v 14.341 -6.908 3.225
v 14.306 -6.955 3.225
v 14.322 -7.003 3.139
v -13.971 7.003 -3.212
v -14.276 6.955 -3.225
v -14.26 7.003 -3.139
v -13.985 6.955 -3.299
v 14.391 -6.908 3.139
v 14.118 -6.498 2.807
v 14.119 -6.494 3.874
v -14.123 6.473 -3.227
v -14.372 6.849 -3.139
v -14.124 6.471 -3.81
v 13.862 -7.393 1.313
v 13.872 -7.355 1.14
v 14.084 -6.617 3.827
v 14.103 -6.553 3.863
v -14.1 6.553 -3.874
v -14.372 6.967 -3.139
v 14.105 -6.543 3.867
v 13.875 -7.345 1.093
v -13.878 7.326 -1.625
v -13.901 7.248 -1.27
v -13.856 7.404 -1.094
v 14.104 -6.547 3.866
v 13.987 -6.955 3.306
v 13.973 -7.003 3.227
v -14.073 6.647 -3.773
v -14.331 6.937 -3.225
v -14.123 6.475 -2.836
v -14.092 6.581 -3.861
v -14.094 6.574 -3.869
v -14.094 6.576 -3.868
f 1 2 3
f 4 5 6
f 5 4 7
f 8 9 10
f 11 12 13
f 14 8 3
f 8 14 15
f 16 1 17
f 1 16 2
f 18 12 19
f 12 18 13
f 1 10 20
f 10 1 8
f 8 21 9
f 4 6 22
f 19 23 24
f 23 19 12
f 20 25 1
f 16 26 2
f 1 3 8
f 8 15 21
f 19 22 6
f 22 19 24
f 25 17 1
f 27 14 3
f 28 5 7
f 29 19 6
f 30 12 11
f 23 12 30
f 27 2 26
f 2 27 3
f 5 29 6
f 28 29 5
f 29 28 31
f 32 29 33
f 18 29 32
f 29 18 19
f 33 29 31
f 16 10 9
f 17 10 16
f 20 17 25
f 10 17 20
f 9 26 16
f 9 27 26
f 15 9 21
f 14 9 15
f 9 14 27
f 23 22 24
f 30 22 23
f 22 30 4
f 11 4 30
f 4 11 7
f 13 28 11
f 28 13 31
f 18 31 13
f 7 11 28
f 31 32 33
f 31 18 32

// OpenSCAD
// Auto-generated OpenSCAD file

    inner_points = 10*[[-1.3196803278726468, 0.9362046957981746, -6.595639077981762e-13], [1.3196795770729461, -0.9362042464911885, 6.595639077981762e-13], [-0.5584491756654331, 1.4751697470422118, -0.3606158710418413], [1.5768378417073974, -0.039640907689503124, -0.360615871040774], [-1.576838592507098, 0.039641356996489185, 0.360615871040774], [0.5584484248657327, -1.4751692977352255, 0.3606158710418413], [0.41609043726663214, 1.4506701799017077, -0.5834887362276886], [1.231697502166666, 0.8720639963146739, -0.583488736227281], [-1.2316982529663667, -0.8720635470076878, 0.583488736227281], [-0.41609118806633266, -1.4506697305947214, 0.5834887362276886], [0.3400958061980706, 0.4794020290670393, -0.8090169943749945], [-0.34009655699777114, -0.47940157976005326, 0.8090169943749945], [-0.6344438067339944, 0.5039015962075438, -0.5861441291891473], [0.685236145738802, -0.43230287493713776, -0.5861441291884877], [-0.6852368965385024, 0.4323033242441238, 0.5861441291884877], [0.634443055934294, -0.5039011469005578, 0.5861441291891473], [0.07599425566871129, 0.9712683754881611, 0.22552825814730598], [0.8916013205687453, 0.3926621919011276, 0.22552825814771355], [-0.8916020713684457, -0.39266174259414155, -0.22552825814771355], [-0.07599500646841176, -0.9712679261811751, -0.22552825814730598]];

    outer_points = 10*[[0.38730796483642055, 0.32816512550448207, 1.536337911895294], [-0.38730796483642055, -0.32816512550448207, -1.536337911895294], [1.122601014421019, -0.22411714494778695, 1.1434913451842328], [0.49592356320214137, -0.7550994719364139, -1.3423556144673943], [-0.49592356320214137, 0.7550994719364139, 1.3423556144673943], [-1.122601014421019, 0.22411714494778695, -1.1434913451842328], [1.4290986323018988, -0.6907942834915881, 0.3138699504541333], [1.189729145919442, -0.8936114849757331, -0.6356390973021997], [-1.189729145919442, 0.8936114849757331, 0.6356390973021997], [-1.4290986323018988, 0.6907942834915881, -0.3138699504541333], [0.9696619025702452, 0.0, -0.24444998405369595], [-0.9696619025702452, 0.0, 0.24444998405369595], [0.6631642846893652, 0.46667713854380116, 0.5851714106764037], [0.2758563198529447, 0.1385120130393191, -0.9511665012188903], [-0.2758563198529447, -0.1385120130393191, 0.9511665012188903], [-0.6631642846893652, -0.46667713854380116, -0.5851714106764037], [0.45943672973165367, -0.6907942834915881, 0.5583199345078292], [0.2200672433491967, -0.8936114849757331, -0.3911891132485038], [-0.2200672433491967, 0.8936114849757331, 0.3911891132485038], [-0.45943672973165367, 0.6907942834915881, -0.5583199345078292]];

    // Convex hull for inner set (I)
    module inner_hull() {
        hull() {
            for (p = inner_points) {
                translate(p) sphere(r=0.1);
            }
        }
    }

    // Convex hull for outer set (O) minus inner hull (O \ I)
    module outer_minus_inner() {
        difference() {
            hull() {
                for (p = outer_points) {
                    translate(p) sphere(r=0.1);
                }
            }
            inner_hull(); // Subtract inner hull
        }
    }

    // Convex hull for outer set (O) minus all translated inner hulls
    module outer_minus_AllTranslationInner() {
        difference() {
            hull() {
                for (p = outer_points) {
                    translate(p) sphere(r=0.1);
                }
            }
            hull() {
                translate([0,0,50]) inner_hull();
                translate([0,0,-50]) inner_hull();
            }; // Subtract translated inner hulls
        }
    }

    // Difference between outer_minus_inner and outer_minus_AllTranslationInner
    module outer_minus_inner_diff() {
        difference() {
            // Outer minus inner
            difference() {
                hull() {
                    for (p = outer_points) {
                        translate(p) sphere(r=0.1);
                    }
                }
                inner_hull();
            }

            // Subtract Outer minus AllTranslationInner
            difference() {
                hull() {
                    for (p = outer_points) {
                        translate(p) sphere(r=0.1);
                    }
                }
                hull() {
                    translate([0,0,50]) inner_hull();
                    translate([0,0,-50]) inner_hull();
                };
            }
        }
    }

    // Rendering all with colors applied
    color([0, 1, 0, 1]) outer_minus_AllTranslationInner(); // Opaque green
    
